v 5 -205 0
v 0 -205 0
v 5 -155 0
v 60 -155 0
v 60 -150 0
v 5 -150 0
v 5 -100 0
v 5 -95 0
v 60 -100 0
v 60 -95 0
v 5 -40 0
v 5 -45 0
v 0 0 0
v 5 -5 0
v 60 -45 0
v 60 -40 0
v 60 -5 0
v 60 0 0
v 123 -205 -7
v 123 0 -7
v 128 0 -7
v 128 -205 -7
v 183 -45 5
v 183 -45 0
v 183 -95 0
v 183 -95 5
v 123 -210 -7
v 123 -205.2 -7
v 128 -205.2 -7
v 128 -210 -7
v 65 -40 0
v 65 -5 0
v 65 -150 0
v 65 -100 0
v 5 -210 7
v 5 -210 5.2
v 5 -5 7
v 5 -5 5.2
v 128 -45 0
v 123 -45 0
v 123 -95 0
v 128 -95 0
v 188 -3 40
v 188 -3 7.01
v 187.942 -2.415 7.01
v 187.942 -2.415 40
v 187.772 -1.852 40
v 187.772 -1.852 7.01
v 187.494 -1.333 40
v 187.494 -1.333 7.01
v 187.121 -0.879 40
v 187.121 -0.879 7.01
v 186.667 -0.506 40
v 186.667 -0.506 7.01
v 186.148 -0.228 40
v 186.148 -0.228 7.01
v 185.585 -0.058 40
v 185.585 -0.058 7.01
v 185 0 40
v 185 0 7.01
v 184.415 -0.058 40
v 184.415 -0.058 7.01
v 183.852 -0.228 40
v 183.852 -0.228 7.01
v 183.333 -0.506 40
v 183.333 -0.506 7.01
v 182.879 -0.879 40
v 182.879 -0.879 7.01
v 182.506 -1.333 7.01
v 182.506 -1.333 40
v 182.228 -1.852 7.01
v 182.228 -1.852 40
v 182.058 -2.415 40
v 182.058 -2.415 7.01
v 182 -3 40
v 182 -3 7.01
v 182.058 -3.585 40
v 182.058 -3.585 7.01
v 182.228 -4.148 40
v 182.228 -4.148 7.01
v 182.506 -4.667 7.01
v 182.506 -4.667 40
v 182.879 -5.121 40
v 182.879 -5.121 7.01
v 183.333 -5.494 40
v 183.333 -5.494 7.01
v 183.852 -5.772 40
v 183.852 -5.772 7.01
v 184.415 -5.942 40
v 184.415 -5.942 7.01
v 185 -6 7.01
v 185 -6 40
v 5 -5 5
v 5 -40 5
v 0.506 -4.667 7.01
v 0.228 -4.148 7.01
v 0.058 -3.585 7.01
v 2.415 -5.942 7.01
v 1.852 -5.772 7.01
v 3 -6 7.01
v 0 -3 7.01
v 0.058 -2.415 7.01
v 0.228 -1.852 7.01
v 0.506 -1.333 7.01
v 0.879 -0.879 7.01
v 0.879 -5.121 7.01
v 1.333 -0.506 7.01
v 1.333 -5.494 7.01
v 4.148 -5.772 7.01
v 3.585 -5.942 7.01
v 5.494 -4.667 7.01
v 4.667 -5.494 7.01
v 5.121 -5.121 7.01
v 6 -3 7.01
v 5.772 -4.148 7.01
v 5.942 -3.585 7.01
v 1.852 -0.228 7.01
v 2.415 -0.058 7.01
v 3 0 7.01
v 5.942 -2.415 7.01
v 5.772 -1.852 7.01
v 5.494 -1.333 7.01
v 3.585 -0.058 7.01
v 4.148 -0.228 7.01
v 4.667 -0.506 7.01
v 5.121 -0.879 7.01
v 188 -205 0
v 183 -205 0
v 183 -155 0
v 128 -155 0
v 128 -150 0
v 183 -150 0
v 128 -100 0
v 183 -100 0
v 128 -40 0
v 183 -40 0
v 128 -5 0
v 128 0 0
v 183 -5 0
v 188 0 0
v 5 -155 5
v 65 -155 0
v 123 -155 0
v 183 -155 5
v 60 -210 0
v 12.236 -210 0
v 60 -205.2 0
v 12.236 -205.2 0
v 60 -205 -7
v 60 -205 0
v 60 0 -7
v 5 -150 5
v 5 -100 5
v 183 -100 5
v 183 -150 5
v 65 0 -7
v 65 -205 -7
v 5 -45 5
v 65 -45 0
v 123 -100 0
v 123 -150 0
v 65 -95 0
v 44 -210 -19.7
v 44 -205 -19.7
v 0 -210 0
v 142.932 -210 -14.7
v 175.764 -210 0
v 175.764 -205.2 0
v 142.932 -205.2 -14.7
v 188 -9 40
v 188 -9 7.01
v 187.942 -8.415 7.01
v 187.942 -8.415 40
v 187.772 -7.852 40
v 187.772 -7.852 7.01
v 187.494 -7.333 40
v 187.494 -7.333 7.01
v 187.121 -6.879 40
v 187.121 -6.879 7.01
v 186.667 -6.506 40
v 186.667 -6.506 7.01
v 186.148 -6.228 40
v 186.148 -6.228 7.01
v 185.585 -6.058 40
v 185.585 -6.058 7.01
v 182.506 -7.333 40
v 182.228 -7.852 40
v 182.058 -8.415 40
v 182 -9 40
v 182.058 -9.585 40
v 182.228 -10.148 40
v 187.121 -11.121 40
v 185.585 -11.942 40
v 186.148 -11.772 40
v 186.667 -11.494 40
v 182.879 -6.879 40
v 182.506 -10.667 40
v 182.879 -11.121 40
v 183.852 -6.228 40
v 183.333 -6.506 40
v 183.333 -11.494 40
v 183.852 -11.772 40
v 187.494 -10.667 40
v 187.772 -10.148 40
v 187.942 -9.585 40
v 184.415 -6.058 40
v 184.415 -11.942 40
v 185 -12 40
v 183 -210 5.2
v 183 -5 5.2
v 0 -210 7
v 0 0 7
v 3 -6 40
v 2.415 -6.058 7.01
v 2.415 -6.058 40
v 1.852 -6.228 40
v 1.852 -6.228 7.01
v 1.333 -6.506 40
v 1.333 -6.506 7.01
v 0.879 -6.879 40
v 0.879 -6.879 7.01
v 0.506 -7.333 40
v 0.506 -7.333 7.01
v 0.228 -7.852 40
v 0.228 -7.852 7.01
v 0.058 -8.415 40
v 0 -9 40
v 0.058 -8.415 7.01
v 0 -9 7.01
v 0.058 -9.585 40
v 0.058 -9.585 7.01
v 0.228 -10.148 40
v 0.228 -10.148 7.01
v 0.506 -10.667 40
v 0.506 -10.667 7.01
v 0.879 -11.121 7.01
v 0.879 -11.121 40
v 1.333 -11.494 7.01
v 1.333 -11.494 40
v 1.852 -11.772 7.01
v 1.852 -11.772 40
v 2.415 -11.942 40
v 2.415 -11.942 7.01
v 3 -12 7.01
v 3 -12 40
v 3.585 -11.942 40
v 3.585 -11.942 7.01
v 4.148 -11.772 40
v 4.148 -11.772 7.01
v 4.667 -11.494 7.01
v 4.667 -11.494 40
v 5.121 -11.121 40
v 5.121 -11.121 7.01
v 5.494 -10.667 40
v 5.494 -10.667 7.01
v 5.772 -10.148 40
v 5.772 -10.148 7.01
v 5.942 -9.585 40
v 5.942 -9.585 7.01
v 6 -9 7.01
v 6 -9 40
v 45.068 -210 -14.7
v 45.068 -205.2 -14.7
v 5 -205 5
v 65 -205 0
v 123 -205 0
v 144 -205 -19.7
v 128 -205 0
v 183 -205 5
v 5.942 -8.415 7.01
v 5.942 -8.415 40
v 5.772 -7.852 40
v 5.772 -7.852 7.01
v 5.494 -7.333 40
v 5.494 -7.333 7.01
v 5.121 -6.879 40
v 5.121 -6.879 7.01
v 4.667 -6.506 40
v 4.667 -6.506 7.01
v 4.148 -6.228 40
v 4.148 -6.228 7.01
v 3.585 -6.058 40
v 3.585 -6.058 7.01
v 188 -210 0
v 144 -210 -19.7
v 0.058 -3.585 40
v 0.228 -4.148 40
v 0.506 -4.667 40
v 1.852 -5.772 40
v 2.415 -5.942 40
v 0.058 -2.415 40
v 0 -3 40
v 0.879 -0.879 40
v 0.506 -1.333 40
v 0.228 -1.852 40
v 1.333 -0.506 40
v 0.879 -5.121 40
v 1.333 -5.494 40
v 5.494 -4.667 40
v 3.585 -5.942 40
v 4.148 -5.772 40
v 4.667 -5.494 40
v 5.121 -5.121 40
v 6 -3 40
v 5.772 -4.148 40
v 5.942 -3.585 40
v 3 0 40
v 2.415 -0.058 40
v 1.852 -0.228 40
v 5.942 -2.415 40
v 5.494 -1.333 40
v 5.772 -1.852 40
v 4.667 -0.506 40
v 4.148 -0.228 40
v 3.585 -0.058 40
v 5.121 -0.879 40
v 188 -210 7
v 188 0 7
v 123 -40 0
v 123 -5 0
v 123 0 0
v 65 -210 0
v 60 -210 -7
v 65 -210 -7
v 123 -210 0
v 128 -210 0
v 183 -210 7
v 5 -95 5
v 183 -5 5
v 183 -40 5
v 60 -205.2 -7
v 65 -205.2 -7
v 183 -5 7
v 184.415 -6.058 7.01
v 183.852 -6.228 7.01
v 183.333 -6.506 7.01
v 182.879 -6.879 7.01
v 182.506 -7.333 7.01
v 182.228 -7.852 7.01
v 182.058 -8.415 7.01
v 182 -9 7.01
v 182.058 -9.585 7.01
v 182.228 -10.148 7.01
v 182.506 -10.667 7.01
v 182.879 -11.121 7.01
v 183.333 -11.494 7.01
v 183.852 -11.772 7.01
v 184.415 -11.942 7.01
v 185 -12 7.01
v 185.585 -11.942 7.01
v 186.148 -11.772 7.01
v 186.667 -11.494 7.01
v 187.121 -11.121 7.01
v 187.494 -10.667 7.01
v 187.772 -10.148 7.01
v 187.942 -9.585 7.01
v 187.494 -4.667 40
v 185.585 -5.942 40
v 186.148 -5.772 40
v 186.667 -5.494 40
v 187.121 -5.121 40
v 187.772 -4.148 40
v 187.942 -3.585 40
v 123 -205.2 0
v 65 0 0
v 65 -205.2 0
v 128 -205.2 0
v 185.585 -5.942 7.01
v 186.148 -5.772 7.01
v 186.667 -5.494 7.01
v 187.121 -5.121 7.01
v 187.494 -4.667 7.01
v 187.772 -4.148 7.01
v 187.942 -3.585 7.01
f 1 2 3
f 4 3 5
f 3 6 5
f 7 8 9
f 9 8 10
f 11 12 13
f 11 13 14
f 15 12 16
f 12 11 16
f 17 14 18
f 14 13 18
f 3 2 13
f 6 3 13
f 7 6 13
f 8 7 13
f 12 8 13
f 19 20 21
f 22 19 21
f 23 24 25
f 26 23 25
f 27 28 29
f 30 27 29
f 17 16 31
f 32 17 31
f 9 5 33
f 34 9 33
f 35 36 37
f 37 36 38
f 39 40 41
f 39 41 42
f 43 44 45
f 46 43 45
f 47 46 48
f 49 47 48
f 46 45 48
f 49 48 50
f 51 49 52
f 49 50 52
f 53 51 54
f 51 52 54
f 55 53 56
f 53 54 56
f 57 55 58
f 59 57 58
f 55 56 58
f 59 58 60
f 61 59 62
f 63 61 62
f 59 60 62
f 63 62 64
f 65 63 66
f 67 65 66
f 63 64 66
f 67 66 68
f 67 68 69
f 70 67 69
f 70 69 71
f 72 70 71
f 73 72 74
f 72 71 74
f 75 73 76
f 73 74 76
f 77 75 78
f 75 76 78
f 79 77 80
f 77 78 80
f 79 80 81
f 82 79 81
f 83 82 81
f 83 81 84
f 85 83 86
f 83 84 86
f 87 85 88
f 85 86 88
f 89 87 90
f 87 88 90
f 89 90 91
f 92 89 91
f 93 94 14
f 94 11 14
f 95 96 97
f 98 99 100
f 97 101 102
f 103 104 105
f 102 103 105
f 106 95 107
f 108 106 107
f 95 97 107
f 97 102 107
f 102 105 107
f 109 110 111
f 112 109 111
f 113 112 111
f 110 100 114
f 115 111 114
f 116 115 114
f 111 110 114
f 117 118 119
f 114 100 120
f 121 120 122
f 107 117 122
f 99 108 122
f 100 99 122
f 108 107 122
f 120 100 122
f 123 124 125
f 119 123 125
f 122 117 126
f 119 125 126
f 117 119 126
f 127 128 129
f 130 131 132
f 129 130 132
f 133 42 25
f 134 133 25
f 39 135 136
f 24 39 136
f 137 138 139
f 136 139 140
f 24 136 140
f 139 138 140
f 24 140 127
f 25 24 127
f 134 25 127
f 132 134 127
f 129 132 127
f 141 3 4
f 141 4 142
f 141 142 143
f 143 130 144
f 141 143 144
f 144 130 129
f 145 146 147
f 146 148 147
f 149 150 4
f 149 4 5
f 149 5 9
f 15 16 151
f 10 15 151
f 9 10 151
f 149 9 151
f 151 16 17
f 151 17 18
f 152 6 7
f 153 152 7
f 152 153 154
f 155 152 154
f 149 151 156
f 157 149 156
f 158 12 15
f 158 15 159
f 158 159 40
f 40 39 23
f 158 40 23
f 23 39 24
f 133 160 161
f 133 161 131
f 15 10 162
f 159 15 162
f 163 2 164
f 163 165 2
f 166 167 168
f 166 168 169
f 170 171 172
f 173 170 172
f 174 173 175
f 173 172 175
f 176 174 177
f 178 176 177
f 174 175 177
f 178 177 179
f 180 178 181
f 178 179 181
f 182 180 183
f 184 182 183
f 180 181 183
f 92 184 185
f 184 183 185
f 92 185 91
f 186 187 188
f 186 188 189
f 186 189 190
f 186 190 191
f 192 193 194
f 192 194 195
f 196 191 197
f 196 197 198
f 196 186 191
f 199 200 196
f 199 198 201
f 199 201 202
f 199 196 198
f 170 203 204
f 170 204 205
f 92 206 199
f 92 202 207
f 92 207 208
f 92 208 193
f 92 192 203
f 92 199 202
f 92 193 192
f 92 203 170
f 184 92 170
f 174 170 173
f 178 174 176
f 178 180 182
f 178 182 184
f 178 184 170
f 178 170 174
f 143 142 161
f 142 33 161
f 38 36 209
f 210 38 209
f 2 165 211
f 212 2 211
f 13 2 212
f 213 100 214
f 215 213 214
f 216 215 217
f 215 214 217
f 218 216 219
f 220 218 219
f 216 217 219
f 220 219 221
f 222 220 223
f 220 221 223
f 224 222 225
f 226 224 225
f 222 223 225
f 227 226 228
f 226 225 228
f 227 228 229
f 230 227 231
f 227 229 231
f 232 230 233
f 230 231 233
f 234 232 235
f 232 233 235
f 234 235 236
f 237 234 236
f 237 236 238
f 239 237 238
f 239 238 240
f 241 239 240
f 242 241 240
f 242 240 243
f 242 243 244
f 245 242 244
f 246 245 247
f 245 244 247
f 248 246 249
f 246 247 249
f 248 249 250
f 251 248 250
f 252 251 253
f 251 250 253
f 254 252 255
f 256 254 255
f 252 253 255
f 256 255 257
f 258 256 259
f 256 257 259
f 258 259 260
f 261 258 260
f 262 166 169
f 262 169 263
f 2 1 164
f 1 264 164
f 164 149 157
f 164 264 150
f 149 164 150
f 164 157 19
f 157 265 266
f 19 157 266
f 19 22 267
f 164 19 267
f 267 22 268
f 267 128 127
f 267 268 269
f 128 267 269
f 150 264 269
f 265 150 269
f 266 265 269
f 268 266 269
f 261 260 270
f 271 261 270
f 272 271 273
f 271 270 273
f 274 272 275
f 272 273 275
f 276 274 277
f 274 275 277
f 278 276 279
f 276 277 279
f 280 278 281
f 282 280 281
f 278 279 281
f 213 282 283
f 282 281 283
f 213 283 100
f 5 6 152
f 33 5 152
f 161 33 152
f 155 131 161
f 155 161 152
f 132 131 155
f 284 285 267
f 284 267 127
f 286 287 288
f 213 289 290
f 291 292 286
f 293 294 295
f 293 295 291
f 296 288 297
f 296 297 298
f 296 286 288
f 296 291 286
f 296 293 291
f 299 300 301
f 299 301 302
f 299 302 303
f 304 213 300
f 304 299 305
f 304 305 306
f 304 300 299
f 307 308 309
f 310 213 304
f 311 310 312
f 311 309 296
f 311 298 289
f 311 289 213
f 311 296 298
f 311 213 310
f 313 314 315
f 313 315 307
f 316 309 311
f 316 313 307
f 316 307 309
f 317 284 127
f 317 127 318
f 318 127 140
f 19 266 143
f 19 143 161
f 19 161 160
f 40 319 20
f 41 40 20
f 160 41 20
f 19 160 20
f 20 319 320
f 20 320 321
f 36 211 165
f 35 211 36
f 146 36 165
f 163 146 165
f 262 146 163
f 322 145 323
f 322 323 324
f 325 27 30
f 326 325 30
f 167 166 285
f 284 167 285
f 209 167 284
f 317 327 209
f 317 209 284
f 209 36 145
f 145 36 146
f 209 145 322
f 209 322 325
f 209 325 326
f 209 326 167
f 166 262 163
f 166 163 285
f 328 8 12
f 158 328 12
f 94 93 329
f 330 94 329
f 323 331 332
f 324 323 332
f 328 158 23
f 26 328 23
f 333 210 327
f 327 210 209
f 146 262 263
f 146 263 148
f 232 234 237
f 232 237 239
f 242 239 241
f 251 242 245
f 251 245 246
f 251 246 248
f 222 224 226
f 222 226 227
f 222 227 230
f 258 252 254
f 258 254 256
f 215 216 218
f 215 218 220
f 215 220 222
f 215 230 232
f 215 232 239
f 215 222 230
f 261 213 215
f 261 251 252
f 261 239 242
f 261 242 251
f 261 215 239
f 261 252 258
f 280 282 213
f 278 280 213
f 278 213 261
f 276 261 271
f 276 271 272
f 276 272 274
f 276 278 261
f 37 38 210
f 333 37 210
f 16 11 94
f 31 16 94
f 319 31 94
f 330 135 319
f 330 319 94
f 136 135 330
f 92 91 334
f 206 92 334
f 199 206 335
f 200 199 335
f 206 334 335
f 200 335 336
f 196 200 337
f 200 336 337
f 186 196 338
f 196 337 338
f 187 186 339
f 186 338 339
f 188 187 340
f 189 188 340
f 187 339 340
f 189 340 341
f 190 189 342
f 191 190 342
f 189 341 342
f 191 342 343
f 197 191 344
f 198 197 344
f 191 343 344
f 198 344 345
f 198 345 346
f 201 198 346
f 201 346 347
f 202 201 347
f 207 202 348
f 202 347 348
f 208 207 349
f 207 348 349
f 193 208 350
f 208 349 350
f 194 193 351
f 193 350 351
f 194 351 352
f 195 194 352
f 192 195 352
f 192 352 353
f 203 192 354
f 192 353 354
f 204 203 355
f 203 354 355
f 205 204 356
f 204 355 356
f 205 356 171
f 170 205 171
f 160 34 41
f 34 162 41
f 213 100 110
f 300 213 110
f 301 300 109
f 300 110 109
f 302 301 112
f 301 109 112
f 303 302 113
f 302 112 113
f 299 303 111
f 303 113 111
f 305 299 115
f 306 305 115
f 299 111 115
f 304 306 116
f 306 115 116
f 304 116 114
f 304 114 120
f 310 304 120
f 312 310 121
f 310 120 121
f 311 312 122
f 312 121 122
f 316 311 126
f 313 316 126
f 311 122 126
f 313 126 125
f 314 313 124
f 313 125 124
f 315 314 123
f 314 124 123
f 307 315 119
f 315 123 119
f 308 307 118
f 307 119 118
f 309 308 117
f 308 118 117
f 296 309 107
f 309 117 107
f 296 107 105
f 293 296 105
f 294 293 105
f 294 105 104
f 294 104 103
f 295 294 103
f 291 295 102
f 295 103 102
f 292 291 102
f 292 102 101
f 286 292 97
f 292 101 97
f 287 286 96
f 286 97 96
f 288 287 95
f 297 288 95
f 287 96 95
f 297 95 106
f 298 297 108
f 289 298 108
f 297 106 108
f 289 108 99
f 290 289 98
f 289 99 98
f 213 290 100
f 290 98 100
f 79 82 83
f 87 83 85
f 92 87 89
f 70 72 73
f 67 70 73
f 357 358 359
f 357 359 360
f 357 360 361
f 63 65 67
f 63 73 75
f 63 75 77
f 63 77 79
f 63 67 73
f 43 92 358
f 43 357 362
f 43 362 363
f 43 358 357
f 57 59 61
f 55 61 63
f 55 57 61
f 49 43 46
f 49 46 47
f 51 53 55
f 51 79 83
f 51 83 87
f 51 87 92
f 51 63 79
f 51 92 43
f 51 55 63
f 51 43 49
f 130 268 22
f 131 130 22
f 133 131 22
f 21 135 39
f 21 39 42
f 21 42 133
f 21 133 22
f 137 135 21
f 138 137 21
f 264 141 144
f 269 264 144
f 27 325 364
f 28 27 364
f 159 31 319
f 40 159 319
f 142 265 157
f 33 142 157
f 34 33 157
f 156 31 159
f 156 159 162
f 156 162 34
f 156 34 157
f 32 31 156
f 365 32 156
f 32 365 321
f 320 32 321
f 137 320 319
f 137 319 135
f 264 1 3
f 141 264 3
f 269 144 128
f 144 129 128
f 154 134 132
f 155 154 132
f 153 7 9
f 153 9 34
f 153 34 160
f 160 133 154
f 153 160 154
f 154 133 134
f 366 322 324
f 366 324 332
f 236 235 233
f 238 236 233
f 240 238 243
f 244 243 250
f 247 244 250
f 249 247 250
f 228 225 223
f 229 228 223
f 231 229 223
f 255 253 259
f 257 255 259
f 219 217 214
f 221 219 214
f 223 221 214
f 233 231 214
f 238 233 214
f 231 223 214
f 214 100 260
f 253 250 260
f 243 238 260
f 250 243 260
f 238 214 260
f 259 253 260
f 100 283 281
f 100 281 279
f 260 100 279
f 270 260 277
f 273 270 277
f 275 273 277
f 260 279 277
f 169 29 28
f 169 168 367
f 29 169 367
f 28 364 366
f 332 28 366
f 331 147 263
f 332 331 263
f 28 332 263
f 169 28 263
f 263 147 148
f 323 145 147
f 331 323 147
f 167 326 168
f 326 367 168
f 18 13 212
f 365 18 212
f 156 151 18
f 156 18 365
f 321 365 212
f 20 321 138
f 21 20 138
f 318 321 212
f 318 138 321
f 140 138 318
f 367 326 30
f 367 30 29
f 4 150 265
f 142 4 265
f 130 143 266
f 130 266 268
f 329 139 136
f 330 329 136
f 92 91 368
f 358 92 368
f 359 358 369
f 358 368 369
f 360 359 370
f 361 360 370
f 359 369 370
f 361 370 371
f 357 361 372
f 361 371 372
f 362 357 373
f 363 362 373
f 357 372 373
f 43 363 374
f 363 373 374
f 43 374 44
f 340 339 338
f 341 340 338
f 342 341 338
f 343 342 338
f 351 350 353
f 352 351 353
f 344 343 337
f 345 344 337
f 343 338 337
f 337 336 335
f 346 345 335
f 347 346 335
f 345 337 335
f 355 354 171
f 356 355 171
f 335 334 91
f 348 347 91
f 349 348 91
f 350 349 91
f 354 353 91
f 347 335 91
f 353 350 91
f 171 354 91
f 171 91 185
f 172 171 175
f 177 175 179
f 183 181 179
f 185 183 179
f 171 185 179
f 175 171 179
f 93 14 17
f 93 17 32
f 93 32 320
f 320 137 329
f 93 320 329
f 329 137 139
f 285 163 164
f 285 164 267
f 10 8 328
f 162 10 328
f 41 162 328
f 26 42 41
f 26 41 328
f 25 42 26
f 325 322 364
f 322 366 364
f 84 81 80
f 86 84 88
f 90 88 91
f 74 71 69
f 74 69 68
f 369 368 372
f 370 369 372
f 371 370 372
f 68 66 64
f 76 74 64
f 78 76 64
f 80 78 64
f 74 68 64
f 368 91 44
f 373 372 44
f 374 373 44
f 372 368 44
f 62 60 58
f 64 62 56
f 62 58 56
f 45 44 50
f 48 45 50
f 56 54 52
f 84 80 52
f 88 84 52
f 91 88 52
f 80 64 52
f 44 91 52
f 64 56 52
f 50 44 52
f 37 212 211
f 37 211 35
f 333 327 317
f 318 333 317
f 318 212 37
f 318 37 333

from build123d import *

# Parameters (mm, degrees)
F1_DEPTH  = 7
F2_W      = 188
F2_H      = 5
F2_H_2    = 5.0000011921
F2_H_3    = 4.999999702
F3_DEPTH  = 5
F4_W      = 4.9999976158
F4_H      = 210
F4_W_2    = 5
F5_DEPTH  = 7
F6_W      = 188
F6_H      = 210
F7_DEPTH  = 0.2
F9_DEPTH  = 5
F10_DEPTH = 5
F12_DEPTH = 0.2
F14_START = 7.01
F14_DEPTH = 32.99


with BuildPart() as f1:
    # F0 (on Top) → F1 (new body)
    with BuildSketch(Plane.XY):
        Polygon((188, 0), (0, 0), (0, -210), (5, -210), (5, -5), (183, -5), (183, -210), (188, -210), align=None)
    extrude(amount=F1_DEPTH)

    # F2 (on Top) → F3 (join)
    with BuildSketch(Plane.XY):
        with Locations((94, -207.5)):
            Rectangle(F2_W, F2_H)
        with Locations((94, -152.5)):
            Rectangle(F2_W, F2_H)
        with Locations((94, -97.499999404)):
            Rectangle(F2_W, F2_H_2)
        with Locations((94, -42.4999989569)):
            Rectangle(F2_W, F2_H_3)
    extrude(amount=F3_DEPTH)

    # F4 (on Top) → F5 (join)
    with BuildSketch(Plane.XY):
        with Locations((62.4999988079, -105)):
            Rectangle(F4_W, F4_H)
        with Locations((125.5, -105)):
            Rectangle(F4_W_2, F4_H)
    extrude(amount=-F5_DEPTH)

    # F6 (on face) → F7 (join)
    with BuildSketch(Plane.XY.offset(5)):
        with Locations((94, -105)):
            Rectangle(F6_W, F6_H)
    extrude(amount=F7_DEPTH)

    # F8 (on face) → F9 (join)
    with BuildSketch(Plane.XZ.offset(210)):
        Polygon((44, -19.7), (94, -19.7), (144, -19.7), (188, 0), (188, 4.9999998882), (0, 4.9999998882), (0, 0), align=None)
        Polygon((175.7642594912, -1.118e-07), (142.9317724312, -14.7), (94, -14.7), (45.0682275688, -14.7), (12.2357405088, -1.118e-07), align=None, mode=Mode.SUBTRACT)
    extrude(amount=-F9_DEPTH)

    # F8 (on face) → F10 (join)
    with BuildSketch(Plane.XZ.offset(210)):
        Polygon((44, -19.7), (94, -19.7), (144, -19.7), (188, 0), (188, 4.9999998882), (0, 4.9999998882), (0, 0), align=None)
        Polygon((175.7642594912, -1.118e-07), (142.9317724312, -14.7), (94, -14.7), (45.0682275688, -14.7), (12.2357405088, -1.118e-07), align=None, mode=Mode.SUBTRACT)
    extrude(amount=-F10_DEPTH)

    # F11 (on face) → F12 (join)
    with BuildSketch(Plane(origin=(0, -205, 0), x_dir=(-1, 0, 0), z_dir=(0, 1, 0))):
        Polygon((0, 0), (-188, 0), (-144, -19.7), (-44, -19.7), align=None)
    extrude(amount=-F12_DEPTH)


with BuildPart() as f14:
    # F13 (on Top) → F14 (new body)
    with BuildSketch(Plane.XY.offset(F14_START)):
        with BuildLine():
            ThreePointArc((3, -6), (5.1213203436, -5.1213203436), (6, -3))
            ThreePointArc((6, -3), (0.8786796564, -0.8786796564), (3, -6))
        make_face()
    extrude(amount=F14_DEPTH)

    # F13 (on Top) → F14, piece 2 (join)
    with BuildSketch(Plane.XY.offset(F14_START)):
        with BuildLine():
            ThreePointArc((6, -9), (5.1213203436, -6.8786796564), (3, -6))
            ThreePointArc((3, -6), (0.8786796564, -11.1213203436), (6, -9))
        make_face()
    extrude(amount=F14_DEPTH)


with BuildPart() as f14b:
    # F13 (on Top) → F14, piece 3 (new body)
    with BuildSketch(Plane.XY.offset(F14_START)):
        with BuildLine():
            ThreePointArc((185, -6), (182.8786796564, -11.1213203436), (188, -9))
            ThreePointArc((188, -9), (187.1213203436, -6.8786796564), (185, -6))
        make_face()
    extrude(amount=F14_DEPTH)

    # F13 (on Top) → F14, piece 4 (join)
    with BuildSketch(Plane.XY.offset(F14_START)):
        with BuildLine():
            ThreePointArc((188, -3), (182.8786796564, -0.8786796564), (185, -6))
            ThreePointArc((185, -6), (187.1213203436, -5.1213203436), (188, -3))
        make_face()
    extrude(amount=F14_DEPTH)


solid = Compound([f1.part, f14.part, f14b.part])
